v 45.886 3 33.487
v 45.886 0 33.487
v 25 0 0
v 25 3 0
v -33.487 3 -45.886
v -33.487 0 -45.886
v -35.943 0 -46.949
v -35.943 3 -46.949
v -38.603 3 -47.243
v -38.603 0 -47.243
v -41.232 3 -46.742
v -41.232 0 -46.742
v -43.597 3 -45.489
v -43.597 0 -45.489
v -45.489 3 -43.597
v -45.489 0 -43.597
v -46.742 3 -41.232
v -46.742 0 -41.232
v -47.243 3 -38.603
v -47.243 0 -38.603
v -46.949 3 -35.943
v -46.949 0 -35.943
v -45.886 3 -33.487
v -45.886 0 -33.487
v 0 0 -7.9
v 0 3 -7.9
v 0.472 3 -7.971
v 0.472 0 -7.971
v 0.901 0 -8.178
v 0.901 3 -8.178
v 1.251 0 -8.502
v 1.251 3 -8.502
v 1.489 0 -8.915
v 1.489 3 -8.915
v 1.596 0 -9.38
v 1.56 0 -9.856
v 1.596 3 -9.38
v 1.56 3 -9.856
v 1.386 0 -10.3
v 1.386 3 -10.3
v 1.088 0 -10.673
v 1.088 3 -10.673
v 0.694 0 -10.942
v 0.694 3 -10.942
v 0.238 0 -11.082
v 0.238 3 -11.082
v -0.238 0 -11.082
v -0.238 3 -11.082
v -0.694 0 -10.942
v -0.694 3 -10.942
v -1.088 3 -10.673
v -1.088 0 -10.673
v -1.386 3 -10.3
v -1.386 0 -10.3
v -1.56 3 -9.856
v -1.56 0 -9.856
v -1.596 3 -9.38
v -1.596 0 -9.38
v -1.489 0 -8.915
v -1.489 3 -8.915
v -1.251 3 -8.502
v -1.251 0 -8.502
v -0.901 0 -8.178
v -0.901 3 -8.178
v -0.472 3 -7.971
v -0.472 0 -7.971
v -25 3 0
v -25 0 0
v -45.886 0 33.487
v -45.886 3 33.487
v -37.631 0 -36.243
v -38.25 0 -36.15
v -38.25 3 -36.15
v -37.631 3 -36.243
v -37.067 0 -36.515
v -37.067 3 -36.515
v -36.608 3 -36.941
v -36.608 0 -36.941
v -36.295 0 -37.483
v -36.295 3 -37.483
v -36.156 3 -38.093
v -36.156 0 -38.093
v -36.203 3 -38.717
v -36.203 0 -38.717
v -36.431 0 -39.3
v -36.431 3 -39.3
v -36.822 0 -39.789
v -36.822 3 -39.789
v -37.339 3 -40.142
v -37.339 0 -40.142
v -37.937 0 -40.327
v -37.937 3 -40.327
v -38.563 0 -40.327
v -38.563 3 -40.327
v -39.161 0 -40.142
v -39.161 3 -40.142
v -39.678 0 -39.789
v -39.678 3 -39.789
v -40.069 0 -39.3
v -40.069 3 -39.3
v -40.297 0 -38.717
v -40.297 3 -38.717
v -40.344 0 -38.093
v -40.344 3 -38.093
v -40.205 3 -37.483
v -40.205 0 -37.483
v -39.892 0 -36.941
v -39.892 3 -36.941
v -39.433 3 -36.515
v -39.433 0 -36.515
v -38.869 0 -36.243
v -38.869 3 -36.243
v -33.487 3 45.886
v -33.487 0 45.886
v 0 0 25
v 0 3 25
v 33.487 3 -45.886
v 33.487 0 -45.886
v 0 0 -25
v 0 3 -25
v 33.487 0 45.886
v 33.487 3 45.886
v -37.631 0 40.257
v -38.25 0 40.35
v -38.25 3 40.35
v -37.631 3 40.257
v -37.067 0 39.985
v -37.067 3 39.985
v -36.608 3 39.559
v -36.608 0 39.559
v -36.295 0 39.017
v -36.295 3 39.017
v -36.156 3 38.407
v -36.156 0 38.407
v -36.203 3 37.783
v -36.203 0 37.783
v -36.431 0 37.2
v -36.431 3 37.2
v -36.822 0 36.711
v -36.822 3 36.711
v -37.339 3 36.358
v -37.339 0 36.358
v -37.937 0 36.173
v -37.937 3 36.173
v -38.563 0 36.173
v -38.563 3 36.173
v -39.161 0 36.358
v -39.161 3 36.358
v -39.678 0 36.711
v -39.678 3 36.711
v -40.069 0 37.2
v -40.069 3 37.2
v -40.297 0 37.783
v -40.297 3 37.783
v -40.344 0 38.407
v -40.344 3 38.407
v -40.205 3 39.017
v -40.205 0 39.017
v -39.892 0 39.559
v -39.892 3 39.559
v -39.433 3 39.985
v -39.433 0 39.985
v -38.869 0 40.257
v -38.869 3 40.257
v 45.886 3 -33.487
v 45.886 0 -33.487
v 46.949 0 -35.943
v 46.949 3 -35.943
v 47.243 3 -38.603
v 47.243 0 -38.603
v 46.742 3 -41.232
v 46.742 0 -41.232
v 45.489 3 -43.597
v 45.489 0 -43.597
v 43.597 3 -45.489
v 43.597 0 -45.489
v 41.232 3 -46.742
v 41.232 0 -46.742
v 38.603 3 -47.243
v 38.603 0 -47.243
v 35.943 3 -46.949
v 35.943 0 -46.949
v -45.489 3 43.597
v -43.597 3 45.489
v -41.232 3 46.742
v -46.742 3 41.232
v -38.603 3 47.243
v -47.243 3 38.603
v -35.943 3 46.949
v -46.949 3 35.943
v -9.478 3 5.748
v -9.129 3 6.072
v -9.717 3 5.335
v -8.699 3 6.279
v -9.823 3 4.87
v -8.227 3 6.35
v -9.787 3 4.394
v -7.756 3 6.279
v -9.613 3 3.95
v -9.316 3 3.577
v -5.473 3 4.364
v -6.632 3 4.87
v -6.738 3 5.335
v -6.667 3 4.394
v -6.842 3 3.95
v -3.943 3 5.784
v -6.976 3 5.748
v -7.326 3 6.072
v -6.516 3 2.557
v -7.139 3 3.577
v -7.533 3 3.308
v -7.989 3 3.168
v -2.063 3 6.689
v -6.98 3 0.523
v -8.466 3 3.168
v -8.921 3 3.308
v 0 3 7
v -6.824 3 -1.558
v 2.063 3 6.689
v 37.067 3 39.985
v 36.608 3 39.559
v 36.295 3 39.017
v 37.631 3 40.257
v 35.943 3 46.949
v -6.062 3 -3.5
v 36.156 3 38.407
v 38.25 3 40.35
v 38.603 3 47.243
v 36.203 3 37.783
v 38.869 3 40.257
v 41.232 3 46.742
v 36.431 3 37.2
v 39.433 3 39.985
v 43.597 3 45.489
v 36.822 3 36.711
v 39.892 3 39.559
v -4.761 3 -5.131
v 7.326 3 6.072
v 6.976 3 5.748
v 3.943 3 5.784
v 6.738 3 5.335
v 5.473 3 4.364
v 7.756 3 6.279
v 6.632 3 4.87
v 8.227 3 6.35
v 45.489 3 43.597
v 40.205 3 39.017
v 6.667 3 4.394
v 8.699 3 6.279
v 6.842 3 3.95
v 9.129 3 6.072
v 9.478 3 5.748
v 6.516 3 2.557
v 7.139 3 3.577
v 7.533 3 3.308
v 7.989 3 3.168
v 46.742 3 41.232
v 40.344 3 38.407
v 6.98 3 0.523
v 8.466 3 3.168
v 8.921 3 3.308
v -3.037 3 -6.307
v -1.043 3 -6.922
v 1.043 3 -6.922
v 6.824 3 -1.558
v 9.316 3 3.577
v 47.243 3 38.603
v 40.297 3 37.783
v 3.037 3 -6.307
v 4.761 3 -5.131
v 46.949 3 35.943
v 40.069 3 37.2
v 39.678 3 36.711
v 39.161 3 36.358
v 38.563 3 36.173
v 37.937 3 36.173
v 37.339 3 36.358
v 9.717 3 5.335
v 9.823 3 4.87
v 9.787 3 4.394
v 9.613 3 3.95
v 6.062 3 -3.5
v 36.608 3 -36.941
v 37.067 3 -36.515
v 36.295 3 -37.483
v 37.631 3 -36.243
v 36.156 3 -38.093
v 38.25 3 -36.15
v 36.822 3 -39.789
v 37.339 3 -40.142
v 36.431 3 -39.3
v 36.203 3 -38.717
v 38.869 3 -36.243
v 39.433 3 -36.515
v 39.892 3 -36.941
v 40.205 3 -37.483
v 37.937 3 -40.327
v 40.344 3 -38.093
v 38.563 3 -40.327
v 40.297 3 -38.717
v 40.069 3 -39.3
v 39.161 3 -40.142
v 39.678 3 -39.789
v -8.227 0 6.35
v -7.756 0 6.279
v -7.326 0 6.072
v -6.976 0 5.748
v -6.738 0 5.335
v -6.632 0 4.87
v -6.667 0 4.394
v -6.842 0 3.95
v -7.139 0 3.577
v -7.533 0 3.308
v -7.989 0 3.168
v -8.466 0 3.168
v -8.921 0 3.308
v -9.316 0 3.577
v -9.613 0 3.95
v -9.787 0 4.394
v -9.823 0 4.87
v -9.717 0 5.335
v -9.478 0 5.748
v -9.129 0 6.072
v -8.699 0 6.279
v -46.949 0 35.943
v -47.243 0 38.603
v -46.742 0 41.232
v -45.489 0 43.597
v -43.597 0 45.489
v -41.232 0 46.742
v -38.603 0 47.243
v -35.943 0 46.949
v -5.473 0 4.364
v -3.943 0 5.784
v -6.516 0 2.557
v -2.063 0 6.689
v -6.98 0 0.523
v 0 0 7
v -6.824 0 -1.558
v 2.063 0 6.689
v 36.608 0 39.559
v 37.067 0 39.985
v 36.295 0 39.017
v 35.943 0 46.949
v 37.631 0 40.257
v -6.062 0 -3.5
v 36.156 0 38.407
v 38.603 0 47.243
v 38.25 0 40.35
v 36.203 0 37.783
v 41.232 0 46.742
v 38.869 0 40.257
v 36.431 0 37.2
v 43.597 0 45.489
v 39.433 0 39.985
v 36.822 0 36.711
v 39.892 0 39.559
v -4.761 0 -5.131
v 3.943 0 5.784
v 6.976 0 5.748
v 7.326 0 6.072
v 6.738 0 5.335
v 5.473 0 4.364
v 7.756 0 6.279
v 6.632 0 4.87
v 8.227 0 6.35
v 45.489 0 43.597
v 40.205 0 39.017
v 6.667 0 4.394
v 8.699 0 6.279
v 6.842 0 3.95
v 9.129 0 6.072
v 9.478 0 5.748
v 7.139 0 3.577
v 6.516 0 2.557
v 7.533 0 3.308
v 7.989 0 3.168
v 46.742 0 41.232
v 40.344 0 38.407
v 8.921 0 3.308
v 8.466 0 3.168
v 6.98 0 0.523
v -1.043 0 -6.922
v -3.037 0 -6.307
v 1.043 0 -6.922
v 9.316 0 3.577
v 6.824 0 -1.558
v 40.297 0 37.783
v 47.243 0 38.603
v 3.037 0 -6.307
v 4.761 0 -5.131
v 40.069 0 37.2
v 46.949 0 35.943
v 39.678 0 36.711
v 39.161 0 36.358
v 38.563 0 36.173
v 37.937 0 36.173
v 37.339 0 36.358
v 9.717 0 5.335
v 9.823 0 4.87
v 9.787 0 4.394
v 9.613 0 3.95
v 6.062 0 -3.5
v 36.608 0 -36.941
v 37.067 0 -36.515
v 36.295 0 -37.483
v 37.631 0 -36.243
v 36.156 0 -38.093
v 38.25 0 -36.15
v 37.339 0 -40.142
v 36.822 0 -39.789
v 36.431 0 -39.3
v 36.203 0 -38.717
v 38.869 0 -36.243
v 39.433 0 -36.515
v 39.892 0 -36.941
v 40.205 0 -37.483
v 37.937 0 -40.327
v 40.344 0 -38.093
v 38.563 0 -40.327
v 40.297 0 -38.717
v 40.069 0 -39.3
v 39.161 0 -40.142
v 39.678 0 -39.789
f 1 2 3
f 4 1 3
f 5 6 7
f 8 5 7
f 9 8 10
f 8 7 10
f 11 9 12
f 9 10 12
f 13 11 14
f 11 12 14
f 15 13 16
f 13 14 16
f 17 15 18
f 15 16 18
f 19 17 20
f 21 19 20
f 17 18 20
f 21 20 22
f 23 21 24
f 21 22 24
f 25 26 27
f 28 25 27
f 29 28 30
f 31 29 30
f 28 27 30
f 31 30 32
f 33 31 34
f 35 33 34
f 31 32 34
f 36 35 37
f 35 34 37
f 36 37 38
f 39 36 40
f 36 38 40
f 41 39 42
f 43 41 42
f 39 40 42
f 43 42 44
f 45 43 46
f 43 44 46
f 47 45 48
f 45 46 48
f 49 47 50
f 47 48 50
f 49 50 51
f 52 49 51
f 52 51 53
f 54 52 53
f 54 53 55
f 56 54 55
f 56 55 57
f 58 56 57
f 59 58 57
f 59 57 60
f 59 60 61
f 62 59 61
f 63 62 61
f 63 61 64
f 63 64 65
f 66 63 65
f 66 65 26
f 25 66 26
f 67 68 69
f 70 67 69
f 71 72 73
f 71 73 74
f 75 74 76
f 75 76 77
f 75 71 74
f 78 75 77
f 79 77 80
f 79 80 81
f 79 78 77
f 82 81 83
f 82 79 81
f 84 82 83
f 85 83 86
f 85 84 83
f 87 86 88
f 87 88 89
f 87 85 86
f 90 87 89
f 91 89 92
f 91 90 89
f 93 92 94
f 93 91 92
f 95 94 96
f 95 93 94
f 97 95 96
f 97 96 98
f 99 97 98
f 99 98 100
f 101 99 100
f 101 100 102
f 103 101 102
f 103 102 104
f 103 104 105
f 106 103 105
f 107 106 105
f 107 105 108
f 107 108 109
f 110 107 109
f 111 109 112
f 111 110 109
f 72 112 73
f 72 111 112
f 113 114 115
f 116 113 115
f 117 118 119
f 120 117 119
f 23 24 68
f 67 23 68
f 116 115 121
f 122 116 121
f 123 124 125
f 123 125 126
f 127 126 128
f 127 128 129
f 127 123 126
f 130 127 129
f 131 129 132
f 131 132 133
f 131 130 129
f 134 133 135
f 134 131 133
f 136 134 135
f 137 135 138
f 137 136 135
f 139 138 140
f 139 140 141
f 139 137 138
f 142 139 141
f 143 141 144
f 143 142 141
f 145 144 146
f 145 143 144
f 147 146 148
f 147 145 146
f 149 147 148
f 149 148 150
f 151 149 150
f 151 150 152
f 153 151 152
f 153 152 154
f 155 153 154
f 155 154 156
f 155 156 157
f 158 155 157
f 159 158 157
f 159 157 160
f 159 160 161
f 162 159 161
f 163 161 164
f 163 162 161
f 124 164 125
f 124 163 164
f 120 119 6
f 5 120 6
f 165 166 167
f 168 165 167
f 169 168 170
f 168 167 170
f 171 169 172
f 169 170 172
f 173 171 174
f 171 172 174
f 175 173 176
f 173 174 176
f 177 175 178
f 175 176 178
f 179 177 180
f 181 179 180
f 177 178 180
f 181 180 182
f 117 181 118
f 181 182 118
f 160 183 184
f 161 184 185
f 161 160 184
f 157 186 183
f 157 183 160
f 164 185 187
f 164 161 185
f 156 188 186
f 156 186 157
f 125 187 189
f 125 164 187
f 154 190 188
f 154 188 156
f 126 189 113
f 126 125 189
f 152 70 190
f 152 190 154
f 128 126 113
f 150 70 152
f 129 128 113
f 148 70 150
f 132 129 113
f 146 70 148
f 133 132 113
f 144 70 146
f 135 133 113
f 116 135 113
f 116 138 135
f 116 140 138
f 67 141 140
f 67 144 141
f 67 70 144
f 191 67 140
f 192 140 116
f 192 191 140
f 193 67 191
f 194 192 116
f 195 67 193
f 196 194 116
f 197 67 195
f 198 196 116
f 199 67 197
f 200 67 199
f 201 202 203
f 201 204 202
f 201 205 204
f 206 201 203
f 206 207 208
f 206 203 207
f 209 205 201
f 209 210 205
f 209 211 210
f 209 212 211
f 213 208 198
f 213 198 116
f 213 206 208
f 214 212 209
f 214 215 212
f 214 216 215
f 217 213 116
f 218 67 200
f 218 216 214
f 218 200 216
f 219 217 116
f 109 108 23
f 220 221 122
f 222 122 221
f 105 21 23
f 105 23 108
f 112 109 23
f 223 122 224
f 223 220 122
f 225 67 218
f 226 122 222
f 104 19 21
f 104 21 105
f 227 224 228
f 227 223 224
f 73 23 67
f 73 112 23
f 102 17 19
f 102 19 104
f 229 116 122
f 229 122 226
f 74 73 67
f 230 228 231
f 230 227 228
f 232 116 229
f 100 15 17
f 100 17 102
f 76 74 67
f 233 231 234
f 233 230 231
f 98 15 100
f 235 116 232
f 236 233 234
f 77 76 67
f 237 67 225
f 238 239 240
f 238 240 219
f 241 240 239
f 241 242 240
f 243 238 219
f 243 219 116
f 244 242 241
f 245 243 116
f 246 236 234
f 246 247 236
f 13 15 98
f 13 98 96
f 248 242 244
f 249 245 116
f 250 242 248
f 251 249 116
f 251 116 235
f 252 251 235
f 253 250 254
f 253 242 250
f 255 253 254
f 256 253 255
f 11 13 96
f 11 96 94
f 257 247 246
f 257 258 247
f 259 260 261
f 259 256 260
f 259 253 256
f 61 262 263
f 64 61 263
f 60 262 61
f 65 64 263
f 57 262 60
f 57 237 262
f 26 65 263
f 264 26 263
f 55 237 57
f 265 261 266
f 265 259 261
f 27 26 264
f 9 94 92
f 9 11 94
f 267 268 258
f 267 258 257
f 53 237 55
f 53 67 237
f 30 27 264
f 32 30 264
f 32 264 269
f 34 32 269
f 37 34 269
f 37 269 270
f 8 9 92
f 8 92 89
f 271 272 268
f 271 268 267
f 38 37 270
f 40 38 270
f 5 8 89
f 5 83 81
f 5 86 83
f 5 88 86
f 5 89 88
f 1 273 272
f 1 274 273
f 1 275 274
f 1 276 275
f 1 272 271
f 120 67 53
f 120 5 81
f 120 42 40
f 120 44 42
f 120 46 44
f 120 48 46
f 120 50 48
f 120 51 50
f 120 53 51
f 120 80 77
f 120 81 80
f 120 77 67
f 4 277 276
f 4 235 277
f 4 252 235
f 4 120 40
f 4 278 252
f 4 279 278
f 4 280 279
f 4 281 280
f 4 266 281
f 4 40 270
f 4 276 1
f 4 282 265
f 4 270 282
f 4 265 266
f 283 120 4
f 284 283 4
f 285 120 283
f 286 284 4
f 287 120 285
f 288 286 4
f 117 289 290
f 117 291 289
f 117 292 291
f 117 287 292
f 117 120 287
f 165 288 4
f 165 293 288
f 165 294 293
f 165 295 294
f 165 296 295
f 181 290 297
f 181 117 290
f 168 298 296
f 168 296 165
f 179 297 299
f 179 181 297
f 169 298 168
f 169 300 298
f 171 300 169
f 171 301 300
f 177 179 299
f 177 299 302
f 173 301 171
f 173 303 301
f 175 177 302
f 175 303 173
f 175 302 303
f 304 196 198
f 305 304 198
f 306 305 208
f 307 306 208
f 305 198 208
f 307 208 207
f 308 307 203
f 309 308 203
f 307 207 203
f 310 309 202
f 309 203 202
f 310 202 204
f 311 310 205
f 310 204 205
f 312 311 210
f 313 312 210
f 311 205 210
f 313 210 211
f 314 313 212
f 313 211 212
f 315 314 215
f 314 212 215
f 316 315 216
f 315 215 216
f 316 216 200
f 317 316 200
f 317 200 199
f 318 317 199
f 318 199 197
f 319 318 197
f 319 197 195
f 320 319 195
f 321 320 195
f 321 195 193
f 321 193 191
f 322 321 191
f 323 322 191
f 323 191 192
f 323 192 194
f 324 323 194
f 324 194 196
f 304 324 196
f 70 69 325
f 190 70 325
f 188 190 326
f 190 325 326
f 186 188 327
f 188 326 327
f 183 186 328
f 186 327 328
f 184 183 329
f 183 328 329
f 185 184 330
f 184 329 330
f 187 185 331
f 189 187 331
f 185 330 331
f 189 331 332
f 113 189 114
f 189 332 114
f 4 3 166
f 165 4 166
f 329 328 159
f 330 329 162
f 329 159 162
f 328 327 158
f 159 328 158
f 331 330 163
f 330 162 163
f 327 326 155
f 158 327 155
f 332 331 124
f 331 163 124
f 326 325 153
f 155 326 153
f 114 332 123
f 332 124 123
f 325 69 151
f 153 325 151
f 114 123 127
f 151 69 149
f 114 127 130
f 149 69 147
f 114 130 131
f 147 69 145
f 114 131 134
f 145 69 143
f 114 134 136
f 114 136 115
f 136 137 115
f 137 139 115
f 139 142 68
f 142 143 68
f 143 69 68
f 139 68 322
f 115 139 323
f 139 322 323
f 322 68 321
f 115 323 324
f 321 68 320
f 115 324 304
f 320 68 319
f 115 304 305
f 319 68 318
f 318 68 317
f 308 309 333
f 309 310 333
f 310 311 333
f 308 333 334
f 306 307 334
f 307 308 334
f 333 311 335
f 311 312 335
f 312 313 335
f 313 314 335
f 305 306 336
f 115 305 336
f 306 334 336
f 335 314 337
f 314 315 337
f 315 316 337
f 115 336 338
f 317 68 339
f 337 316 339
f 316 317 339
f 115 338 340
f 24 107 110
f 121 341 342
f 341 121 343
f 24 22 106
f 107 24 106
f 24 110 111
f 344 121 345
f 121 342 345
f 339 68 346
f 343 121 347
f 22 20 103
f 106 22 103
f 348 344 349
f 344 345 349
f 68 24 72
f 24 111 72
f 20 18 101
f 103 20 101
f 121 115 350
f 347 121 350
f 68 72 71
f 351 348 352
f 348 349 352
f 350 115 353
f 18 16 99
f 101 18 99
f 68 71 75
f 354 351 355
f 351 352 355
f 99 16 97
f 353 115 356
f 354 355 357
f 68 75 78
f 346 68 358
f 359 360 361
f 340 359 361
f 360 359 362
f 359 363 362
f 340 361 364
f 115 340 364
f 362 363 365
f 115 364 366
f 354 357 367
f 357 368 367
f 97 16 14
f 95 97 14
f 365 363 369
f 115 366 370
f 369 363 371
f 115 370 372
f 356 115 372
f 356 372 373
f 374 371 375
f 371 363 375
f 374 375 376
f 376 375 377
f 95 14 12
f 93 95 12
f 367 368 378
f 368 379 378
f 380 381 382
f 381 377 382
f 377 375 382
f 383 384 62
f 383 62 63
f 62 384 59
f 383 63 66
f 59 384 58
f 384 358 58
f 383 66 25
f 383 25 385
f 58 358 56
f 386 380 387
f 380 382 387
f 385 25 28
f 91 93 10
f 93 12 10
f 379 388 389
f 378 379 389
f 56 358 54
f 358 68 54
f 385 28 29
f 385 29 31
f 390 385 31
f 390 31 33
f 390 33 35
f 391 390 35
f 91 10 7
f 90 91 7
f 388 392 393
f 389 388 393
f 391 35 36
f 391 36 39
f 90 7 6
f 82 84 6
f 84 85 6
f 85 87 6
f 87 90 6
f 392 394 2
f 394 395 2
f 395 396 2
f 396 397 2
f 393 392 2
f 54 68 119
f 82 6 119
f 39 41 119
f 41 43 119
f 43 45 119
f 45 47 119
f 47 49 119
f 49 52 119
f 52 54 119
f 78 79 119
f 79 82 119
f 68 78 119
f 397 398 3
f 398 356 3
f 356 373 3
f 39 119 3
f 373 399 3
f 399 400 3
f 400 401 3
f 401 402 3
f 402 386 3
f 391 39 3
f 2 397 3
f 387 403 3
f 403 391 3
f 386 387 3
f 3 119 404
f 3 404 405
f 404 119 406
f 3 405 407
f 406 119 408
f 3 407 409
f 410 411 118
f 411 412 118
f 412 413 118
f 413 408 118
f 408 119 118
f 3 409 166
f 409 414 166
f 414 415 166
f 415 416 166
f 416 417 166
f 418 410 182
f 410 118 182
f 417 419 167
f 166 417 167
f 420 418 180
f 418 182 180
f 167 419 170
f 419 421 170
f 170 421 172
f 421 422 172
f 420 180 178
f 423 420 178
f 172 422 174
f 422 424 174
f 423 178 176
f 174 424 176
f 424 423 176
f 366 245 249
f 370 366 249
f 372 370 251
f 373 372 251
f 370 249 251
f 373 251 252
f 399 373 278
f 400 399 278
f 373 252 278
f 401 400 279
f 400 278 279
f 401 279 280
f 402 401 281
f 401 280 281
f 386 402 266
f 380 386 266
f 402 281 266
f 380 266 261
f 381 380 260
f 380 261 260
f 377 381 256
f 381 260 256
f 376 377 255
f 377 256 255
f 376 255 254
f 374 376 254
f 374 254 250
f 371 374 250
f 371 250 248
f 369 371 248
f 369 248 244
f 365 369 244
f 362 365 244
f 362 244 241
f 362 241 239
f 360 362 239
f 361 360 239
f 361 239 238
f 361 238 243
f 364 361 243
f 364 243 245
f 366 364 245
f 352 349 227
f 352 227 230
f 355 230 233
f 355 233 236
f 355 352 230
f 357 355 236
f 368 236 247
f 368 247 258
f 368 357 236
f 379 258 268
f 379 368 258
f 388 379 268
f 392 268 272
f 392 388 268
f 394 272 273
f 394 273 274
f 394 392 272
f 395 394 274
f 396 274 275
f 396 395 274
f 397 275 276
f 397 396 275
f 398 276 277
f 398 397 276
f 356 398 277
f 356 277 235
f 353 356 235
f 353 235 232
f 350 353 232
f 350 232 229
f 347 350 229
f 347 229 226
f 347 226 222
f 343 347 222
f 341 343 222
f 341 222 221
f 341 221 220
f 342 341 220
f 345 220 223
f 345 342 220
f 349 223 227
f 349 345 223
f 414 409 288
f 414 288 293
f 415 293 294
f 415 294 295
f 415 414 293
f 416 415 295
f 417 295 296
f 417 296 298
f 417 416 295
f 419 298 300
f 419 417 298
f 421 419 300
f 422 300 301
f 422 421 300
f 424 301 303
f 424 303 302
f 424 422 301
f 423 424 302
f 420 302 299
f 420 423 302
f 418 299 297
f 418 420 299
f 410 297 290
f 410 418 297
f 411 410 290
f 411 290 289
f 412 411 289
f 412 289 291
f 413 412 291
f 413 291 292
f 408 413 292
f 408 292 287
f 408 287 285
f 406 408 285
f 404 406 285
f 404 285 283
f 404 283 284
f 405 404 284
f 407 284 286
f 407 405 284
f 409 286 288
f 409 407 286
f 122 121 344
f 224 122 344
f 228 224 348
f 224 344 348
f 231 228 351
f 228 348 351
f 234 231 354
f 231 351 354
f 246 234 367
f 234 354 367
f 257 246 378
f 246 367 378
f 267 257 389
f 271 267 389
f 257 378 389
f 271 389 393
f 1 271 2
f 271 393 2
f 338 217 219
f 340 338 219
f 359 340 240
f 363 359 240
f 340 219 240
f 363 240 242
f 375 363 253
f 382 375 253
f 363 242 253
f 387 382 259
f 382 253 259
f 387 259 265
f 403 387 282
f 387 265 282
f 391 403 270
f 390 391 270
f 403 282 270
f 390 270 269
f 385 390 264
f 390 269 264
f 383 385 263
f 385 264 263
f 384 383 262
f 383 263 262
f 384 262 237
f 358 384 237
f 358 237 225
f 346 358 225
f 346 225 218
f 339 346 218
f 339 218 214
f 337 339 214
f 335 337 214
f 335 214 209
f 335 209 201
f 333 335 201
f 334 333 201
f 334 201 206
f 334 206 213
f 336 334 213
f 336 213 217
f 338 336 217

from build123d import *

# Parameters (mm, degrees)
SKETCH_1_R          = 2.1
EXTRUDE_1_DEPTH     = 3
SKETCH_2_R          = 7
SKETCH_2_R_2        = 1.6
CUT_EXTRUDE_1_DEPTH = 10


with BuildPart() as part:
    # 草图1 → 凸台-拉伸1 (new body)
    with BuildSketch(Plane(origin=(0, 0, 0), x_dir=(1, 0, 0), z_dir=(0, 1, 0))):
        with BuildLine():
            Line((-45.88639118, 33.487067107), (-25, 0))
            Line((-25, 0), (-45.88639118, -33.487067107))
            ThreePointArc((-45.88639118, -33.487067107), (-44.613961031, -44.613961031), (-33.487067107, -45.88639118))
            Line((-33.487067107, -45.88639118), (0, -25))
            Line((0, -25), (33.487067107, -45.88639118))
            ThreePointArc((33.487067107, -45.88639118), (44.613961031, -44.613961031), (45.88639118, -33.487067107))
            Line((45.88639118, -33.487067107), (25, 0))
            Line((25, 0), (45.88639118, 33.487067107))
            ThreePointArc((45.88639118, 33.487067107), (44.613961031, 44.613961031), (33.487067107, 45.88639118))
            Line((33.487067107, 45.88639118), (0, 25))
            Line((0, 25), (-33.487067107, 45.88639118))
            ThreePointArc((-33.487067107, 45.88639118), (-44.613961031, 44.613961031), (-45.88639118, 33.487067107))
        make_face()
        with Locations(Location((38.25, 38.25, 0), (0, 0, 270))):
            Circle(SKETCH_1_R, mode=Mode.SUBTRACT)
        with Locations(Location((-38.25, -38.25, 0), (0, 0, 270))):
            Circle(SKETCH_1_R, mode=Mode.SUBTRACT)
        with Locations(Location((38.25, -38.25, 0), (0, 0, 270))):
            Circle(SKETCH_1_R, mode=Mode.SUBTRACT)
        with Locations(Location((-38.25, 38.25, 0), (0, 0, 270))):
            Circle(SKETCH_1_R, mode=Mode.SUBTRACT)
    extrude(amount=EXTRUDE_1_DEPTH)

    # 草图2 → 切除-拉伸1 (cut)
    with BuildSketch(Plane(origin=(0, 3, 0), x_dir=(1, 0, 0), z_dir=(0, 1, 0))):
        with Locations(Location((0, 0, 0), (0, 0, 270))):
            Circle(SKETCH_2_R)
        with Locations(Location((0, 9.5, 0), (0, 0, 270))):
            Circle(SKETCH_2_R_2)
        with Locations(Location((8.227241336, -4.75, 0), (0, 0, 270))):
            Circle(SKETCH_2_R_2)
        with Locations(Location((-8.227241336, -4.75, 0), (0, 0, 270))):
            Circle(SKETCH_2_R_2)
    extrude(amount=-CUT_EXTRUDE_1_DEPTH, mode=Mode.SUBTRACT)


solid = part.part
